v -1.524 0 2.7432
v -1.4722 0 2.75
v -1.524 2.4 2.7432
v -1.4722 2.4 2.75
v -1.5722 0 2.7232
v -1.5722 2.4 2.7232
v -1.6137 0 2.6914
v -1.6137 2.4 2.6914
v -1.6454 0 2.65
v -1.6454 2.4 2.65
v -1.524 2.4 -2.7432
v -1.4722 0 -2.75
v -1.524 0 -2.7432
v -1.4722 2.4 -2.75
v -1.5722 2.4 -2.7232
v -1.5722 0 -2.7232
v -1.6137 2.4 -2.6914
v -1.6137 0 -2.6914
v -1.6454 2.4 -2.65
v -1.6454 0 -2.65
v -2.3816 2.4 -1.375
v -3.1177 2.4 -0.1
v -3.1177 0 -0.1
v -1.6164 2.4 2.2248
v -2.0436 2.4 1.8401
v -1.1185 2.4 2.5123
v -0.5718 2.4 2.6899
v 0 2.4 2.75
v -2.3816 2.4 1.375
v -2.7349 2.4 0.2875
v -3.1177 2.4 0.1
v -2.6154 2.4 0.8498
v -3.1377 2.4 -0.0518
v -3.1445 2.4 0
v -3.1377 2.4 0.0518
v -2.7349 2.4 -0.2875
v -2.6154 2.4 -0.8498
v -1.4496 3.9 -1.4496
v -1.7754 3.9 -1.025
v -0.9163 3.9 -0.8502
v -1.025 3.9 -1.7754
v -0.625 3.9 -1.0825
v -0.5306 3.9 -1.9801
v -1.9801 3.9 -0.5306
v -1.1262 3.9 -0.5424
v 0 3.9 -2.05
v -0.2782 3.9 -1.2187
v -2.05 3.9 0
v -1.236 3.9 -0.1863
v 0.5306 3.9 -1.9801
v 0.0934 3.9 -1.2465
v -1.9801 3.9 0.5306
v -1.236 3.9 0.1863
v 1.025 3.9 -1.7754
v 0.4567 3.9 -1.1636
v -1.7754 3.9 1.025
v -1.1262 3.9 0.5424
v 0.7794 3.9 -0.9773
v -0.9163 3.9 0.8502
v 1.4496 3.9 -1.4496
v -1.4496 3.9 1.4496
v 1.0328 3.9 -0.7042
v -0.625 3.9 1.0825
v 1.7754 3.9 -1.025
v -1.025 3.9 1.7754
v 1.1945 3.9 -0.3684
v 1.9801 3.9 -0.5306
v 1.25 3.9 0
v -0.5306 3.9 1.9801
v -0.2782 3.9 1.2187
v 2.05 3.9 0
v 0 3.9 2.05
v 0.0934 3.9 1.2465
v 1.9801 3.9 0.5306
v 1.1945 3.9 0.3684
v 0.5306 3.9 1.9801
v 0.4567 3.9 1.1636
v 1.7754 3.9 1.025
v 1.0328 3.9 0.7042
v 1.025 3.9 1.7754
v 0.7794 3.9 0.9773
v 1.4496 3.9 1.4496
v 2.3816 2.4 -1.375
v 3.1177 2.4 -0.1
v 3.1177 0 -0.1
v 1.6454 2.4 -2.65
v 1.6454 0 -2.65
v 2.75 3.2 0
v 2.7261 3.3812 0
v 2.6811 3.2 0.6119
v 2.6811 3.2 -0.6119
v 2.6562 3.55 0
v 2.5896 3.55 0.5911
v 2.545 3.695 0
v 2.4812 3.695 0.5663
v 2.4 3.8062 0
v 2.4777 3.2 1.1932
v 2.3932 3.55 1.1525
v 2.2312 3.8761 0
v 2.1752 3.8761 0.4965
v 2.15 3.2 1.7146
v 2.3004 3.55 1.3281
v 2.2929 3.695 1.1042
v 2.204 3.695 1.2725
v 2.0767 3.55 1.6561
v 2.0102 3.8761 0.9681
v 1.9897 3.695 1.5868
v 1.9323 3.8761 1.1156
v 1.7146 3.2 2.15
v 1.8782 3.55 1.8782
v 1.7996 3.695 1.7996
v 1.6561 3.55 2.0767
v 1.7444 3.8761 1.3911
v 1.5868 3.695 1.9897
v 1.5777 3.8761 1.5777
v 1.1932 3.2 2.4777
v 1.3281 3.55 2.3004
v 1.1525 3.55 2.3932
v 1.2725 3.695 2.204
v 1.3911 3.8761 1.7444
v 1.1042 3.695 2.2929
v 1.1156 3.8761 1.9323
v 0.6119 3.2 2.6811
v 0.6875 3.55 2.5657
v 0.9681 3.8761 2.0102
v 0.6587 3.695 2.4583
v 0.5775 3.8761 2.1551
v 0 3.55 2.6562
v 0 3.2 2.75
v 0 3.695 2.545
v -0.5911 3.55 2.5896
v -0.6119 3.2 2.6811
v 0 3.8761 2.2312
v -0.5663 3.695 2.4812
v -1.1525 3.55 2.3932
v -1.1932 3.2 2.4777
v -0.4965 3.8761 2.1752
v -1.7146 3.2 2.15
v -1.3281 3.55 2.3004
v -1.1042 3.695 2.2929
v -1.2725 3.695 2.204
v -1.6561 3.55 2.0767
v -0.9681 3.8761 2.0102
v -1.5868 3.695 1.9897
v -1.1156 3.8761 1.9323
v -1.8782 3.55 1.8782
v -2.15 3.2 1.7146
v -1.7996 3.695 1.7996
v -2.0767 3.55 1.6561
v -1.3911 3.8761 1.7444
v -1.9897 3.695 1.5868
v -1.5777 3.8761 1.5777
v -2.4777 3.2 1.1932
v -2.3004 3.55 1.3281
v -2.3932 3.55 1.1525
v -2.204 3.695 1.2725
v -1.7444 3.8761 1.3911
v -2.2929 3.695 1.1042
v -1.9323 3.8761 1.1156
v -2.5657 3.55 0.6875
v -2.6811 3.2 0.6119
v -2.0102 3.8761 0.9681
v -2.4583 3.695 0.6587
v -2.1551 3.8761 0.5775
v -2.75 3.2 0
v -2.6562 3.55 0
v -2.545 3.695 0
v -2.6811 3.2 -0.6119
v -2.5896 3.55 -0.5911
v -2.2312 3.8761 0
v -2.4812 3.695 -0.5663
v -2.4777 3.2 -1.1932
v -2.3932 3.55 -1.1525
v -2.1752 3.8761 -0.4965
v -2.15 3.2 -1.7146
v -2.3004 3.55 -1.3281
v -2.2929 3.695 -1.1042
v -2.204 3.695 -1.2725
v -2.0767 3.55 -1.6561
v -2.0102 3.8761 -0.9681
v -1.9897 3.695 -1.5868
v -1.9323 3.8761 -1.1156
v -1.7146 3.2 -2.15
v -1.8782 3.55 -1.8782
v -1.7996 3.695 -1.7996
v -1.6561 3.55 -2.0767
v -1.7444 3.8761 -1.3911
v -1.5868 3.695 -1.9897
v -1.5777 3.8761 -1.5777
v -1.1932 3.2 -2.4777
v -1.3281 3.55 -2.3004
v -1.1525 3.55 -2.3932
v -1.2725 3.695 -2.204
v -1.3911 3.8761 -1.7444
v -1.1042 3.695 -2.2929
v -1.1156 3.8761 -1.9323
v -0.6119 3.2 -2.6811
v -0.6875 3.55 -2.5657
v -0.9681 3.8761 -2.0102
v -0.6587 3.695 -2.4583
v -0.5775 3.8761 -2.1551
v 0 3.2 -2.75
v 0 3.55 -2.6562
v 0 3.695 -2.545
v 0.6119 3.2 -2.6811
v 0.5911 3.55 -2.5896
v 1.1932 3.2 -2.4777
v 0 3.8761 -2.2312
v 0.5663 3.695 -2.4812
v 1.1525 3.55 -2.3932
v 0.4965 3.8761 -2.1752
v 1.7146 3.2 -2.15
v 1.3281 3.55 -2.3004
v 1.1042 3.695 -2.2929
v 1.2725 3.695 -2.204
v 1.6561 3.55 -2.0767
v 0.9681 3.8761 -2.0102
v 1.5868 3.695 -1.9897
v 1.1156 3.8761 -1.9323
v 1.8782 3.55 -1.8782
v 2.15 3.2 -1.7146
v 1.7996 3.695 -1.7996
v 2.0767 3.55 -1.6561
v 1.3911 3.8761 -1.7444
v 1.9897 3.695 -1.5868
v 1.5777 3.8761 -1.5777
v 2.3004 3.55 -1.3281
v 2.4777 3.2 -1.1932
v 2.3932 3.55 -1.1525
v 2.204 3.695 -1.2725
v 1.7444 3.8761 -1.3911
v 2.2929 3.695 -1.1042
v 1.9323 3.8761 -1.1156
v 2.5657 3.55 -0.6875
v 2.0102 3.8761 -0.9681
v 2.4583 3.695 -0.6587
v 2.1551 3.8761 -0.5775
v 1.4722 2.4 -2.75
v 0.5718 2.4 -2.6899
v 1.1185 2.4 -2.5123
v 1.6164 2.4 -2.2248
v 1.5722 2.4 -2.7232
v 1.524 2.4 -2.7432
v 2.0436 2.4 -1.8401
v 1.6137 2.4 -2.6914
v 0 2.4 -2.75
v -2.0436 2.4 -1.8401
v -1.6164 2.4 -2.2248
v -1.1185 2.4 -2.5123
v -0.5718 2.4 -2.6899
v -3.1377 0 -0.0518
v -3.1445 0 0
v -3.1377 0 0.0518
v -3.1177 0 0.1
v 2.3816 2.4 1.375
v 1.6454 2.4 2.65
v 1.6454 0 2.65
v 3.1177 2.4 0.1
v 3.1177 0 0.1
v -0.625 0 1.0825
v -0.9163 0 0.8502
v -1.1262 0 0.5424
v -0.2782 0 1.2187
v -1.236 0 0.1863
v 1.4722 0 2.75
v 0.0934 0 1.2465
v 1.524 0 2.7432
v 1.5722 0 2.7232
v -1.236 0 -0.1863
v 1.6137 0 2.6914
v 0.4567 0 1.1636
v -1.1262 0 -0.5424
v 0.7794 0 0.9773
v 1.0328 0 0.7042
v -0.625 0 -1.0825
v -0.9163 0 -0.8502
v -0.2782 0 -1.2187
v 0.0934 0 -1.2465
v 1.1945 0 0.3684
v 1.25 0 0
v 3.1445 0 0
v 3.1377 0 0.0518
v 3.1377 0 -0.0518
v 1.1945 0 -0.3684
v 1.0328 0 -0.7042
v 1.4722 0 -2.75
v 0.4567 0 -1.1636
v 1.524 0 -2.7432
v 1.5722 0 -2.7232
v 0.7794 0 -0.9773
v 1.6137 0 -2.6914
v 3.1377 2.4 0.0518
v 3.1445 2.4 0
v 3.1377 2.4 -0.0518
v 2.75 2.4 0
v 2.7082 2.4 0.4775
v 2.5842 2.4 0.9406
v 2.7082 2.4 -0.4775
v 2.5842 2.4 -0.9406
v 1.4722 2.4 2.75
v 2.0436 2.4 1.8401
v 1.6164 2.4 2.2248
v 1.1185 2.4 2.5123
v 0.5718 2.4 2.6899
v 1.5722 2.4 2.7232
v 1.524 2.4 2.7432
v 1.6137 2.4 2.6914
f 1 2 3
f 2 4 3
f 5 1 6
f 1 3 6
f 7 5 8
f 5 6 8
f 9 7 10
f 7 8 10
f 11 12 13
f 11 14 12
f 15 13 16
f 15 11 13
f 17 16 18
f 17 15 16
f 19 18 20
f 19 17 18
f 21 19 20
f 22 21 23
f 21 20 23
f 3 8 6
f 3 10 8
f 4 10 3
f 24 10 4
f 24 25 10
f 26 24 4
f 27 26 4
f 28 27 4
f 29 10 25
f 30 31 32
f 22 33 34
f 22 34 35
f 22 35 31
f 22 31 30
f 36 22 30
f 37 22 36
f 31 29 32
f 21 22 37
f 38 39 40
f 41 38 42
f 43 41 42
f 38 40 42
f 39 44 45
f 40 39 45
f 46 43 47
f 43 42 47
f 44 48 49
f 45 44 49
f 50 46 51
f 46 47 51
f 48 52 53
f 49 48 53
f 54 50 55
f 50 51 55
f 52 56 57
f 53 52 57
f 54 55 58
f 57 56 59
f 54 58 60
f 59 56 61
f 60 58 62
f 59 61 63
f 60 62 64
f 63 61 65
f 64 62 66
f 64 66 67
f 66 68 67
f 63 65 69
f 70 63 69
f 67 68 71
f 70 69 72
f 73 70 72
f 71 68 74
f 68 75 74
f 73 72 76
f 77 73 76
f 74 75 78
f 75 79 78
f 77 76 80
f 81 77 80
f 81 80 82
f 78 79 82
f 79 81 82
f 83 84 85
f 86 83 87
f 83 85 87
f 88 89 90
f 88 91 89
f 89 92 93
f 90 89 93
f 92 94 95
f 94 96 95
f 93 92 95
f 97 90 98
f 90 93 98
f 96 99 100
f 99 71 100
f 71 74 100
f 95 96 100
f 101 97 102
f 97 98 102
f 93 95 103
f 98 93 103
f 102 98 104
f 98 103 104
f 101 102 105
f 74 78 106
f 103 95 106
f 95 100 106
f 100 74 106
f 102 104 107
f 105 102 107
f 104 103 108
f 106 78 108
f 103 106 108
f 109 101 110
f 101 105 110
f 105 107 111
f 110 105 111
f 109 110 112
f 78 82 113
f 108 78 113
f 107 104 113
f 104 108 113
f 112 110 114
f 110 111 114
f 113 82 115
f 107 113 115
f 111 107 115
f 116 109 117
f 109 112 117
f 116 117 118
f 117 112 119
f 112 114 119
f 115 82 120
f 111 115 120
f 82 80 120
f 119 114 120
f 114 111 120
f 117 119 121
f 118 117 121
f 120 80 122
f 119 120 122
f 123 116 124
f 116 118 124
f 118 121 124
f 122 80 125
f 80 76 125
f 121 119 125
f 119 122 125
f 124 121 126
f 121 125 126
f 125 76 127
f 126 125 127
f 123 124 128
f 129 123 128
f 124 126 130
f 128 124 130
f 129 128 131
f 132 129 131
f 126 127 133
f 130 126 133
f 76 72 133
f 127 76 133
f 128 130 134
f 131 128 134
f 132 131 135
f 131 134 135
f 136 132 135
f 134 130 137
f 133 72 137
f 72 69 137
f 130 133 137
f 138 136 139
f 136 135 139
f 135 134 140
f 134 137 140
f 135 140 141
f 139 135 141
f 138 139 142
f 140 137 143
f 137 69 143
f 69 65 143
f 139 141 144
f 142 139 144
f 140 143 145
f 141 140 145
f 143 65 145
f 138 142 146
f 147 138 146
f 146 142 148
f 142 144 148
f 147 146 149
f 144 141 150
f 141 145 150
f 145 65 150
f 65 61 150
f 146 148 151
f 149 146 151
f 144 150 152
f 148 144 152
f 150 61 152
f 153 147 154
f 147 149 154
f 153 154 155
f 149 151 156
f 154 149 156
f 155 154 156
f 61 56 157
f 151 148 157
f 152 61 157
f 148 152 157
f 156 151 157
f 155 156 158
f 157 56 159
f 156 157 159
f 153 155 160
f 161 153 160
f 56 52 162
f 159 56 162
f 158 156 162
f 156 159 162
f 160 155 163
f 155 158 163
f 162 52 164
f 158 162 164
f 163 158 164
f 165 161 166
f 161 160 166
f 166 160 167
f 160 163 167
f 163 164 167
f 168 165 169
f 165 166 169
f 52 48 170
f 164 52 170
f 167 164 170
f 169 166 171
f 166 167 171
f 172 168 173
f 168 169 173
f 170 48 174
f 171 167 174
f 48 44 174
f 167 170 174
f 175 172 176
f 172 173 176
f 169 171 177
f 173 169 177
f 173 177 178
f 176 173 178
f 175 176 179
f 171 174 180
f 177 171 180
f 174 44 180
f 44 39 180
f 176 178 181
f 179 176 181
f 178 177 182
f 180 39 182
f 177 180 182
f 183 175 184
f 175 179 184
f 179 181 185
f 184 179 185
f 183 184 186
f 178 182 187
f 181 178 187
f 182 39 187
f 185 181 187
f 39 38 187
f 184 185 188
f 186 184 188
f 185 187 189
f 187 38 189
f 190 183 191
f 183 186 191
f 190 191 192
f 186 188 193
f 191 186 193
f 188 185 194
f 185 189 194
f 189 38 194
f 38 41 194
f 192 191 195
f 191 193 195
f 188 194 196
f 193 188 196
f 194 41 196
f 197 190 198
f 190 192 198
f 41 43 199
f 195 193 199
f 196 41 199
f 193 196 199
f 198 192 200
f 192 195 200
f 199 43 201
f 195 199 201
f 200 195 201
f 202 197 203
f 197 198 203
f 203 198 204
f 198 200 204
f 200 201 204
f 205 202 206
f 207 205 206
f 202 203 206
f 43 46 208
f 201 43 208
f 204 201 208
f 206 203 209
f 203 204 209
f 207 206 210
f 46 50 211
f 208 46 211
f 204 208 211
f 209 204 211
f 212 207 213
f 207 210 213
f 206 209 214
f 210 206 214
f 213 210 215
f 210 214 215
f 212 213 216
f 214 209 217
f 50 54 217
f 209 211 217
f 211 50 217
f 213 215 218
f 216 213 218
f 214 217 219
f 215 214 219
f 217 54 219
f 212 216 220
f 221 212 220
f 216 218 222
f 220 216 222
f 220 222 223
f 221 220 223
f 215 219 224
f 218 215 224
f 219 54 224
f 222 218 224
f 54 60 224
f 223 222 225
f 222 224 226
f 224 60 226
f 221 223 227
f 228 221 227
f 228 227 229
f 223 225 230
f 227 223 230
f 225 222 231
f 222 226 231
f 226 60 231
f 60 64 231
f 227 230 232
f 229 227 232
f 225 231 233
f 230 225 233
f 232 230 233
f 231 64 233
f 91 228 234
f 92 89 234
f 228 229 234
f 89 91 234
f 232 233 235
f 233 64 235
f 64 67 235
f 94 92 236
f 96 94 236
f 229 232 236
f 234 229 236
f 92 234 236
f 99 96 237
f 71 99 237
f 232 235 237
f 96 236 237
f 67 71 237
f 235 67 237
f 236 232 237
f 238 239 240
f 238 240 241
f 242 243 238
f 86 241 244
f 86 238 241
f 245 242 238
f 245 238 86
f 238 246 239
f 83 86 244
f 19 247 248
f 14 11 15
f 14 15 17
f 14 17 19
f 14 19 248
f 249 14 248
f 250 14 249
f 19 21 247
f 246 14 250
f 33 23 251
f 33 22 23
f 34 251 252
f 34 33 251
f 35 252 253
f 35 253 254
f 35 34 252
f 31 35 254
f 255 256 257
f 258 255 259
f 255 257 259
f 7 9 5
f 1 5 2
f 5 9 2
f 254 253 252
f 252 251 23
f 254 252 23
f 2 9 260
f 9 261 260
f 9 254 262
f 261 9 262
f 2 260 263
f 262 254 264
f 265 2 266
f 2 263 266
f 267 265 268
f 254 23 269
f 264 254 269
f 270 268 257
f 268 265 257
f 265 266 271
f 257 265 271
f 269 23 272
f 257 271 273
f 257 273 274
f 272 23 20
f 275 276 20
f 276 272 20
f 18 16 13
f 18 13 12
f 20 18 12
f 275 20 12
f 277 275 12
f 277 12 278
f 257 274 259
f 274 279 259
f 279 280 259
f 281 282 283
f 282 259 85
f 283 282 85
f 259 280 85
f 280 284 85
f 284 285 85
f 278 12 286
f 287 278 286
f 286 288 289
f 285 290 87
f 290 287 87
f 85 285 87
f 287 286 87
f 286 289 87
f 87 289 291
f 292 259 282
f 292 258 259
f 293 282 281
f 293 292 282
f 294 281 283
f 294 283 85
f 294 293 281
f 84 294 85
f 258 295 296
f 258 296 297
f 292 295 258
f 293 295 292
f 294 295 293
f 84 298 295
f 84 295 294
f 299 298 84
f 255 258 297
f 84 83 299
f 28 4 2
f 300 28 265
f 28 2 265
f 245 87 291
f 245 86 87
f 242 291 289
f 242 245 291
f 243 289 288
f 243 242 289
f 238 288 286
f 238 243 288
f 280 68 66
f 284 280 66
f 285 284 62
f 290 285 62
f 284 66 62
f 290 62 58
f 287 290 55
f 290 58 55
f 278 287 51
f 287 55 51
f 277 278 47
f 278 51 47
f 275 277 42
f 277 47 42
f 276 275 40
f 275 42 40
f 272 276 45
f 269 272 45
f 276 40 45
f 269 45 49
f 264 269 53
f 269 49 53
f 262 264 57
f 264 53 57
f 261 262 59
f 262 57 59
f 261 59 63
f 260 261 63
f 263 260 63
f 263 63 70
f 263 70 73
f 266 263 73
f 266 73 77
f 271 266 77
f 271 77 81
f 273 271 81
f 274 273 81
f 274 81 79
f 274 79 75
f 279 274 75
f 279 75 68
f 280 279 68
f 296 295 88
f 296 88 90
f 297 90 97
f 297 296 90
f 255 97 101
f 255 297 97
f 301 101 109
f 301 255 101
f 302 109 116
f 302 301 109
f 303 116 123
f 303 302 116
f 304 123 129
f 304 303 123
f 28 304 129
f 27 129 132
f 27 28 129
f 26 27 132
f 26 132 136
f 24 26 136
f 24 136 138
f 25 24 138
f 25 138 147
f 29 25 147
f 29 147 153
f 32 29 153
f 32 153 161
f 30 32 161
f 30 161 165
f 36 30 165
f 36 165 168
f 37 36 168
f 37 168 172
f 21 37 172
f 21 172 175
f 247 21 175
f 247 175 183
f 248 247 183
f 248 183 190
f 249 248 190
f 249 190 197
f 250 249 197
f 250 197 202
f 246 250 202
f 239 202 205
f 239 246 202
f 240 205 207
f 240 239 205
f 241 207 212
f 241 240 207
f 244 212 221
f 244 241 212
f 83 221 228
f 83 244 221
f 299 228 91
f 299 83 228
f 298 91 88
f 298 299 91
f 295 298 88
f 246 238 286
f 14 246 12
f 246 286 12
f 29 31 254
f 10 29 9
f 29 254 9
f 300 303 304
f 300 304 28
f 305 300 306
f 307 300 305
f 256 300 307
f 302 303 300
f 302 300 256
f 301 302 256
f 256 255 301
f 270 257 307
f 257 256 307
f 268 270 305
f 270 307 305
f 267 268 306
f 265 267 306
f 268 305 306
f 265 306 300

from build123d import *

# Parameters (mm, degrees)
BOSS_EXTRUDE1_DEPTH = 2.4
SKETCH2_R           = 2.75
BOSS_EXTRUDE2_DEPTH = 3.9
FILLET1_R           = 0.7
FILLET2_R           = 0.2
M3_TAPPED_HOLE1_D   = 2.5


with BuildPart() as part:
    # Sketch1 → Boss-Extrude1 (new body)
    with BuildSketch(Plane(origin=(0, 0, 0), x_dir=(1, 0, 0), z_dir=(0, 1, 0))):
        Polygon((3.175426481, 0), (1.58771324, 2.75), (-1.58771324, 2.75), (-3.175426481, 0), (-1.58771324, -2.75), (1.58771324, -2.75), align=None)
    extrude(amount=BOSS_EXTRUDE1_DEPTH)

    # Sketch2 → Boss-Extrude2 (add)
    with BuildSketch(Plane.XZ):
        Circle(SKETCH2_R)
    extrude(amount=-BOSS_EXTRUDE2_DEPTH)

    # Fillet1
    fillet1_edges = [part.edges().sort_by_distance(p)[0] for p in [
        (-2.75, 3.9, 0),
    ]]
    fillet(fillet1_edges, radius=FILLET1_R)

    # Fillet2
    fillet2_edges = [part.edges().sort_by_distance(p)[0] for p in [
        (1.58771324, 1.2, 2.75),
        (-1.58771324, 1.2, 2.75),
        (-3.175426481, 1.2, 0),
        (-1.58771324, 1.2, -2.75),
        (1.58771324, 1.2, -2.75),
        (3.175426481, 1.2, 0),
    ]]
    fillet(fillet2_edges, radius=FILLET2_R)

    # M3 Tapped Hole1 (through all)
    with Locations(Plane(origin=(0, 0, 0), x_dir=(-1, 0, 0), z_dir=(0, -1, 0))):
        with Locations((0, 0)):
            Hole(M3_TAPPED_HOLE1_D / 2)


solid = part.part
